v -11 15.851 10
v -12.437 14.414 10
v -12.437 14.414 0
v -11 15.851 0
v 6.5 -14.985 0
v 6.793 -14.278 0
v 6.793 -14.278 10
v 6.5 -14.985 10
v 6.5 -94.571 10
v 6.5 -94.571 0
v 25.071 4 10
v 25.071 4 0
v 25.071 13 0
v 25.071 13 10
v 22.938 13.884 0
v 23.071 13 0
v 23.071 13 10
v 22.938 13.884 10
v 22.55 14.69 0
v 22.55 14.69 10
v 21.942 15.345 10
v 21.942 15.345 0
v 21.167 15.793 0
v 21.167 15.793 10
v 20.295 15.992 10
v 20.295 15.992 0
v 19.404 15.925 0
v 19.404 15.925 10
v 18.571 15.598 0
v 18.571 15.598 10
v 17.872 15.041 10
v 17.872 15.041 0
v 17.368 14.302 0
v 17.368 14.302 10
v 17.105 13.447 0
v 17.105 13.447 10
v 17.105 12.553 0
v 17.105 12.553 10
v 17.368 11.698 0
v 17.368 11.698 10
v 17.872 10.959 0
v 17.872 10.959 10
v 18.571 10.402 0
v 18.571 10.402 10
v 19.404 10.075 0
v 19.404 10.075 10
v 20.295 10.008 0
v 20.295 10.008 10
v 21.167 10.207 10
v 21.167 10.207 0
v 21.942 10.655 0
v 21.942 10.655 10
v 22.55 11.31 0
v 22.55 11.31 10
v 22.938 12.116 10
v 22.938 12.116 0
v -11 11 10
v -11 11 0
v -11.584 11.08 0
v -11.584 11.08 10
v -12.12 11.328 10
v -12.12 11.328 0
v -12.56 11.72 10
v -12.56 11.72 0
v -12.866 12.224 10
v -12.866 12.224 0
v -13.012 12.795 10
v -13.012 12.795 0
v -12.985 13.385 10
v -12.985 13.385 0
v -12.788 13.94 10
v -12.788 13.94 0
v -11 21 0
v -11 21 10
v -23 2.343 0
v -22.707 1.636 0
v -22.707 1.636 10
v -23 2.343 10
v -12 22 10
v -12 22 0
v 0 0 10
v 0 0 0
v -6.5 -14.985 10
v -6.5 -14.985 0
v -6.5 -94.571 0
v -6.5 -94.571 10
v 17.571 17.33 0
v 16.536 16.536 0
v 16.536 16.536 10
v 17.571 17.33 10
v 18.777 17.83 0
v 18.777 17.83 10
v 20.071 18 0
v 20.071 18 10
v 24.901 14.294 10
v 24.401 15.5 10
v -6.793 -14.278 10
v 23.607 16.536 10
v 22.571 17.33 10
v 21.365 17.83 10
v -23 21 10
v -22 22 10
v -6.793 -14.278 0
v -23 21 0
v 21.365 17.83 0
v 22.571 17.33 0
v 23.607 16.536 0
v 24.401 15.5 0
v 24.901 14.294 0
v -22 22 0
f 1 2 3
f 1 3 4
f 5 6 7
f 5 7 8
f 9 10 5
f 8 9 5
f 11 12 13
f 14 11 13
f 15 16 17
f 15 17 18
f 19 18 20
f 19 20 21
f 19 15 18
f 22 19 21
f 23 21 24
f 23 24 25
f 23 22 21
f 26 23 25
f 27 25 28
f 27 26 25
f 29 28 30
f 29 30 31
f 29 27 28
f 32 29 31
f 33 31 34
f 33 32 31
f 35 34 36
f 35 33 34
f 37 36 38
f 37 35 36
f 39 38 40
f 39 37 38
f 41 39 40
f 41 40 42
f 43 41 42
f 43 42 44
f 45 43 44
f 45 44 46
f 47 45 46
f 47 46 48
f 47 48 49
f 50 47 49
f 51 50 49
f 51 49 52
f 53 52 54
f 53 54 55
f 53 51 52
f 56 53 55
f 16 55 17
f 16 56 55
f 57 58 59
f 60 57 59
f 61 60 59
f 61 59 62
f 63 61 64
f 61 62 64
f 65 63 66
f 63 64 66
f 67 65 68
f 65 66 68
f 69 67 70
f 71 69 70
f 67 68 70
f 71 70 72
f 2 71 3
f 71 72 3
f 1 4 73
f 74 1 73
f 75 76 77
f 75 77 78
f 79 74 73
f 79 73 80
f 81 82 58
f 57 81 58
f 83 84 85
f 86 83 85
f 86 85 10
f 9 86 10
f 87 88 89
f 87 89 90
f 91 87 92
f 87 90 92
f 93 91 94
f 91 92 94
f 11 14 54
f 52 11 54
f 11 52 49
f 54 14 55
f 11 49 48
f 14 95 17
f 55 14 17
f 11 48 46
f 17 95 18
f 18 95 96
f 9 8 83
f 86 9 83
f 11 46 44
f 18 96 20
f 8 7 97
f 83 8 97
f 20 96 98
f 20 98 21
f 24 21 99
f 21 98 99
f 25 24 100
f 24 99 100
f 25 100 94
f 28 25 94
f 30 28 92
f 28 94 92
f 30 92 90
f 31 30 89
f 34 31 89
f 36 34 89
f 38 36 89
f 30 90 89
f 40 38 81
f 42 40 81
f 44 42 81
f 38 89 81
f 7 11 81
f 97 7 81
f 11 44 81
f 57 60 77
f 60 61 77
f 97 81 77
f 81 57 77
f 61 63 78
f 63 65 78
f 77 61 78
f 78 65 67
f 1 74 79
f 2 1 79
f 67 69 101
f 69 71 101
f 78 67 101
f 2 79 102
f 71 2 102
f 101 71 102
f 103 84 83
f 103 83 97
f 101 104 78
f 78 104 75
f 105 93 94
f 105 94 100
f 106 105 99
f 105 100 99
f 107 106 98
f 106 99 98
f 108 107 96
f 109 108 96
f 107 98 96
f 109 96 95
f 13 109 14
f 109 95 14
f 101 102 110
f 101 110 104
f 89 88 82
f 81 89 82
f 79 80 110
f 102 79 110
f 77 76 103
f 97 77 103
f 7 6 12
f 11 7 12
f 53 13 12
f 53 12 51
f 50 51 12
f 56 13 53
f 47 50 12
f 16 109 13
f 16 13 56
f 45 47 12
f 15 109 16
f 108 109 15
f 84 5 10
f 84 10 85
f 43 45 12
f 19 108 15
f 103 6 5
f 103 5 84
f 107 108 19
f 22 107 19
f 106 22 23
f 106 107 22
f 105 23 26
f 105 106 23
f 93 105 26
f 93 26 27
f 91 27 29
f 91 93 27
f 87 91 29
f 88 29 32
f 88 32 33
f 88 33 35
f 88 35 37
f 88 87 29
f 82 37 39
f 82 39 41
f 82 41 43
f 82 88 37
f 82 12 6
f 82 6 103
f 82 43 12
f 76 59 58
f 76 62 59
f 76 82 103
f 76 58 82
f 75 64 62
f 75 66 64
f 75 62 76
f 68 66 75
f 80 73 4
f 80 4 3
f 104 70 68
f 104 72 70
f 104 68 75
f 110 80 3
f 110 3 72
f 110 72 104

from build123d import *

# Parameters (mm, degrees)
F0_R        = 3
F1_DEPTH    = 10
F2_R        = 5
F3_R        = 4.99999
F4_T1_DEPTH = 10
F4_T3_DEPTH = 15.1433659759
F4_T5_DEPTH = 12.2571417204


# Not quite as in the source:
# - a fillet or chamfer that OpenCascade refuses, or shapes differently, is made with other operations: its cross-section is extruded or revolved along the edge and cut away or added
# - a fillet or chamfer is up to 0.001 mm smaller than in the source, because OpenCascade refuses the exact size


with BuildPart() as f1:
    # F0 (on Top) → F1 (new body)
    with BuildSketch(Plane.XY):
        with BuildLine():
            Line((18, 18), (0, 0))
            Line((0, 0), (-11, 11))
            ThreePointArc((-11, 11), (-12.8659446975, 12.2241130817), (-12.4367385267, 14.4140867148))
            Line((-12.4367385267, 14.4140867148), (-11, 15.8508252416))
            Line((-11, 15.8508252416), (-11, 21.9997463049))
            Line((-11, 21.9997463049), (-23, 21.9997463049))
            Line((-23, 21.9997463049), (-23, 1.9289321881))
            Line((-23, 1.9289321881), (-6.5, -14.5710678119))
            Line((-6.5, -14.5710678119), (-6.5, -94.5710678119))
            Line((-6.5, -94.5710678119), (6.5, -94.5710678119))
            Line((6.5, -94.5710678119), (6.5, -14.5710678119))
            Line((6.5, -14.5710678119), (25.0710678119, 4))
            Line((25.0710678119, 4), (25.0710678119, 18))
            Line((25.0710678119, 18), (18, 18))
        make_face()
        with Locations((20.0710678119, 13)):
            Circle(F0_R, mode=Mode.SUBTRACT)
    extrude(amount=F1_DEPTH)

    # F2
    f2_edges = [f1.edges().sort_by_distance(p)[0] for p in [
        (18, 18, 5),
    ]]
    fillet(f2_edges, radius=F2_R)

    # F3 (radius 5 in the source; OpenCascade refuses exactly that, so slightly less here)
    f3_edges = [f1.edges().sort_by_distance(p)[0] for p in [
        (25.071068, 18, 5),
    ]]
    fillet(f3_edges, radius=F3_R)

    # F4: chamfer of 1 on 5 edges, made by hand

    # F4_s2 → F4_t1 (join)
    with BuildSketch(Plane.XY):
        Polygon((-6.5, -14.9852813742), (-6.7928932188, -14.2781745931), (-6.5, -14.5710678119), align=None)
        Polygon((6.7928932188, -14.2781745931), (6.5, -14.9852813742), (6.5, -14.5710678119), align=None)
    extrude(amount=F4_T1_DEPTH)

    # F4_s4 → F4_t3 (cut)
    with BuildSketch(Plane.XY.offset(-2.571682988)):
        Polygon((-11, 20.9997463049), (-12, 21.9997463049), (-11, 21.9997463049), align=None)
        Polygon((-22, 21.9997463049), (-23, 20.9997463049), (-23, 21.9997463049), align=None)
    extrude(amount=F4_T3_DEPTH, mode=Mode.SUBTRACT)

    # F4_s6 → F4_t5 (cut)
    with BuildSketch(Plane.XY.offset(-1.1285708602)):
        Polygon((-22.7071067812, 1.6360389693), (-23, 2.3431457505), (-23, 1.9289321881), align=None)
    extrude(amount=F4_T5_DEPTH, mode=Mode.SUBTRACT)


solid = f1.part
